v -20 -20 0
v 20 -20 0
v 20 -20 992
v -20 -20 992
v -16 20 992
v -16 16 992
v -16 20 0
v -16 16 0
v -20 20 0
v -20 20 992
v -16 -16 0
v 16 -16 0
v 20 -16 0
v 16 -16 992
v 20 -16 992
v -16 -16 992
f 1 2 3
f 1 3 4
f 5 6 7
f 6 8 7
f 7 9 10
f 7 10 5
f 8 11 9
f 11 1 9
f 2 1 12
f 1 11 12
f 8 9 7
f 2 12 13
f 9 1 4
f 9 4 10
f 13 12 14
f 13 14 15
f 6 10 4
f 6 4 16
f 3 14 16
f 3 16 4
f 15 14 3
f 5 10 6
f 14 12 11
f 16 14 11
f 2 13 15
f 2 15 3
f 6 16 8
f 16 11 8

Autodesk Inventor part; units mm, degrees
ref_plane "YZ Plane" through (0, 0, 0) normal (1, 0, 0) x (0, 1, 0)
ref_plane "XZ Plane" through (0, 0, 0) normal (0, 1, 0) x (-1, 0, 0)
ref_plane "XY Plane" through (0, 0, 0) normal (0, 0, 1) x (1, 0, 0)
sketch "Boceto1" plane through (0, 0, 0) normal (0, 0, 1) x (1, 0, 0)
  line L0 (-20, 20) -> (20, 20)
  line L1 (20, 20) -> (20, -20)
  line L2 (20, -20) -> (-20, -20)
  line L3 (-20, -20) -> (-20, 20)
  line L4 (-20, 20) -> (20, -20) construction
  line L5 (-16, 16) -> (16, 16)
  line L6 (16, 16) -> (16, -16)
  line L7 (16, -16) -> (-16, -16)
  line L8 (-16, -16) -> (-16, 16)
  line L9 (-16, 0) -> (-20, 0) construction
  line L10 (0, 16) -> (0, 20) construction
  line L11 (16, 0) -> (20, 0) construction
  line L12 (0, -16) -> (0, -20) construction
  line L13 (-16, 16) -> (-16, 20)
  line L14 (16, -16) -> (20, -16)
  point P0 (0, 0)
  point P1 (0, 0)
  dimension "d0" = 40
  dimension "d1" = 4
  dimension "d4" = 40
extrude "Extrusión1" add sketch "Boceto1" along normal blind 992 contours L0 L13 L8 L7 L14 L1 L2 L3
properties part number "C_358_40_2"
